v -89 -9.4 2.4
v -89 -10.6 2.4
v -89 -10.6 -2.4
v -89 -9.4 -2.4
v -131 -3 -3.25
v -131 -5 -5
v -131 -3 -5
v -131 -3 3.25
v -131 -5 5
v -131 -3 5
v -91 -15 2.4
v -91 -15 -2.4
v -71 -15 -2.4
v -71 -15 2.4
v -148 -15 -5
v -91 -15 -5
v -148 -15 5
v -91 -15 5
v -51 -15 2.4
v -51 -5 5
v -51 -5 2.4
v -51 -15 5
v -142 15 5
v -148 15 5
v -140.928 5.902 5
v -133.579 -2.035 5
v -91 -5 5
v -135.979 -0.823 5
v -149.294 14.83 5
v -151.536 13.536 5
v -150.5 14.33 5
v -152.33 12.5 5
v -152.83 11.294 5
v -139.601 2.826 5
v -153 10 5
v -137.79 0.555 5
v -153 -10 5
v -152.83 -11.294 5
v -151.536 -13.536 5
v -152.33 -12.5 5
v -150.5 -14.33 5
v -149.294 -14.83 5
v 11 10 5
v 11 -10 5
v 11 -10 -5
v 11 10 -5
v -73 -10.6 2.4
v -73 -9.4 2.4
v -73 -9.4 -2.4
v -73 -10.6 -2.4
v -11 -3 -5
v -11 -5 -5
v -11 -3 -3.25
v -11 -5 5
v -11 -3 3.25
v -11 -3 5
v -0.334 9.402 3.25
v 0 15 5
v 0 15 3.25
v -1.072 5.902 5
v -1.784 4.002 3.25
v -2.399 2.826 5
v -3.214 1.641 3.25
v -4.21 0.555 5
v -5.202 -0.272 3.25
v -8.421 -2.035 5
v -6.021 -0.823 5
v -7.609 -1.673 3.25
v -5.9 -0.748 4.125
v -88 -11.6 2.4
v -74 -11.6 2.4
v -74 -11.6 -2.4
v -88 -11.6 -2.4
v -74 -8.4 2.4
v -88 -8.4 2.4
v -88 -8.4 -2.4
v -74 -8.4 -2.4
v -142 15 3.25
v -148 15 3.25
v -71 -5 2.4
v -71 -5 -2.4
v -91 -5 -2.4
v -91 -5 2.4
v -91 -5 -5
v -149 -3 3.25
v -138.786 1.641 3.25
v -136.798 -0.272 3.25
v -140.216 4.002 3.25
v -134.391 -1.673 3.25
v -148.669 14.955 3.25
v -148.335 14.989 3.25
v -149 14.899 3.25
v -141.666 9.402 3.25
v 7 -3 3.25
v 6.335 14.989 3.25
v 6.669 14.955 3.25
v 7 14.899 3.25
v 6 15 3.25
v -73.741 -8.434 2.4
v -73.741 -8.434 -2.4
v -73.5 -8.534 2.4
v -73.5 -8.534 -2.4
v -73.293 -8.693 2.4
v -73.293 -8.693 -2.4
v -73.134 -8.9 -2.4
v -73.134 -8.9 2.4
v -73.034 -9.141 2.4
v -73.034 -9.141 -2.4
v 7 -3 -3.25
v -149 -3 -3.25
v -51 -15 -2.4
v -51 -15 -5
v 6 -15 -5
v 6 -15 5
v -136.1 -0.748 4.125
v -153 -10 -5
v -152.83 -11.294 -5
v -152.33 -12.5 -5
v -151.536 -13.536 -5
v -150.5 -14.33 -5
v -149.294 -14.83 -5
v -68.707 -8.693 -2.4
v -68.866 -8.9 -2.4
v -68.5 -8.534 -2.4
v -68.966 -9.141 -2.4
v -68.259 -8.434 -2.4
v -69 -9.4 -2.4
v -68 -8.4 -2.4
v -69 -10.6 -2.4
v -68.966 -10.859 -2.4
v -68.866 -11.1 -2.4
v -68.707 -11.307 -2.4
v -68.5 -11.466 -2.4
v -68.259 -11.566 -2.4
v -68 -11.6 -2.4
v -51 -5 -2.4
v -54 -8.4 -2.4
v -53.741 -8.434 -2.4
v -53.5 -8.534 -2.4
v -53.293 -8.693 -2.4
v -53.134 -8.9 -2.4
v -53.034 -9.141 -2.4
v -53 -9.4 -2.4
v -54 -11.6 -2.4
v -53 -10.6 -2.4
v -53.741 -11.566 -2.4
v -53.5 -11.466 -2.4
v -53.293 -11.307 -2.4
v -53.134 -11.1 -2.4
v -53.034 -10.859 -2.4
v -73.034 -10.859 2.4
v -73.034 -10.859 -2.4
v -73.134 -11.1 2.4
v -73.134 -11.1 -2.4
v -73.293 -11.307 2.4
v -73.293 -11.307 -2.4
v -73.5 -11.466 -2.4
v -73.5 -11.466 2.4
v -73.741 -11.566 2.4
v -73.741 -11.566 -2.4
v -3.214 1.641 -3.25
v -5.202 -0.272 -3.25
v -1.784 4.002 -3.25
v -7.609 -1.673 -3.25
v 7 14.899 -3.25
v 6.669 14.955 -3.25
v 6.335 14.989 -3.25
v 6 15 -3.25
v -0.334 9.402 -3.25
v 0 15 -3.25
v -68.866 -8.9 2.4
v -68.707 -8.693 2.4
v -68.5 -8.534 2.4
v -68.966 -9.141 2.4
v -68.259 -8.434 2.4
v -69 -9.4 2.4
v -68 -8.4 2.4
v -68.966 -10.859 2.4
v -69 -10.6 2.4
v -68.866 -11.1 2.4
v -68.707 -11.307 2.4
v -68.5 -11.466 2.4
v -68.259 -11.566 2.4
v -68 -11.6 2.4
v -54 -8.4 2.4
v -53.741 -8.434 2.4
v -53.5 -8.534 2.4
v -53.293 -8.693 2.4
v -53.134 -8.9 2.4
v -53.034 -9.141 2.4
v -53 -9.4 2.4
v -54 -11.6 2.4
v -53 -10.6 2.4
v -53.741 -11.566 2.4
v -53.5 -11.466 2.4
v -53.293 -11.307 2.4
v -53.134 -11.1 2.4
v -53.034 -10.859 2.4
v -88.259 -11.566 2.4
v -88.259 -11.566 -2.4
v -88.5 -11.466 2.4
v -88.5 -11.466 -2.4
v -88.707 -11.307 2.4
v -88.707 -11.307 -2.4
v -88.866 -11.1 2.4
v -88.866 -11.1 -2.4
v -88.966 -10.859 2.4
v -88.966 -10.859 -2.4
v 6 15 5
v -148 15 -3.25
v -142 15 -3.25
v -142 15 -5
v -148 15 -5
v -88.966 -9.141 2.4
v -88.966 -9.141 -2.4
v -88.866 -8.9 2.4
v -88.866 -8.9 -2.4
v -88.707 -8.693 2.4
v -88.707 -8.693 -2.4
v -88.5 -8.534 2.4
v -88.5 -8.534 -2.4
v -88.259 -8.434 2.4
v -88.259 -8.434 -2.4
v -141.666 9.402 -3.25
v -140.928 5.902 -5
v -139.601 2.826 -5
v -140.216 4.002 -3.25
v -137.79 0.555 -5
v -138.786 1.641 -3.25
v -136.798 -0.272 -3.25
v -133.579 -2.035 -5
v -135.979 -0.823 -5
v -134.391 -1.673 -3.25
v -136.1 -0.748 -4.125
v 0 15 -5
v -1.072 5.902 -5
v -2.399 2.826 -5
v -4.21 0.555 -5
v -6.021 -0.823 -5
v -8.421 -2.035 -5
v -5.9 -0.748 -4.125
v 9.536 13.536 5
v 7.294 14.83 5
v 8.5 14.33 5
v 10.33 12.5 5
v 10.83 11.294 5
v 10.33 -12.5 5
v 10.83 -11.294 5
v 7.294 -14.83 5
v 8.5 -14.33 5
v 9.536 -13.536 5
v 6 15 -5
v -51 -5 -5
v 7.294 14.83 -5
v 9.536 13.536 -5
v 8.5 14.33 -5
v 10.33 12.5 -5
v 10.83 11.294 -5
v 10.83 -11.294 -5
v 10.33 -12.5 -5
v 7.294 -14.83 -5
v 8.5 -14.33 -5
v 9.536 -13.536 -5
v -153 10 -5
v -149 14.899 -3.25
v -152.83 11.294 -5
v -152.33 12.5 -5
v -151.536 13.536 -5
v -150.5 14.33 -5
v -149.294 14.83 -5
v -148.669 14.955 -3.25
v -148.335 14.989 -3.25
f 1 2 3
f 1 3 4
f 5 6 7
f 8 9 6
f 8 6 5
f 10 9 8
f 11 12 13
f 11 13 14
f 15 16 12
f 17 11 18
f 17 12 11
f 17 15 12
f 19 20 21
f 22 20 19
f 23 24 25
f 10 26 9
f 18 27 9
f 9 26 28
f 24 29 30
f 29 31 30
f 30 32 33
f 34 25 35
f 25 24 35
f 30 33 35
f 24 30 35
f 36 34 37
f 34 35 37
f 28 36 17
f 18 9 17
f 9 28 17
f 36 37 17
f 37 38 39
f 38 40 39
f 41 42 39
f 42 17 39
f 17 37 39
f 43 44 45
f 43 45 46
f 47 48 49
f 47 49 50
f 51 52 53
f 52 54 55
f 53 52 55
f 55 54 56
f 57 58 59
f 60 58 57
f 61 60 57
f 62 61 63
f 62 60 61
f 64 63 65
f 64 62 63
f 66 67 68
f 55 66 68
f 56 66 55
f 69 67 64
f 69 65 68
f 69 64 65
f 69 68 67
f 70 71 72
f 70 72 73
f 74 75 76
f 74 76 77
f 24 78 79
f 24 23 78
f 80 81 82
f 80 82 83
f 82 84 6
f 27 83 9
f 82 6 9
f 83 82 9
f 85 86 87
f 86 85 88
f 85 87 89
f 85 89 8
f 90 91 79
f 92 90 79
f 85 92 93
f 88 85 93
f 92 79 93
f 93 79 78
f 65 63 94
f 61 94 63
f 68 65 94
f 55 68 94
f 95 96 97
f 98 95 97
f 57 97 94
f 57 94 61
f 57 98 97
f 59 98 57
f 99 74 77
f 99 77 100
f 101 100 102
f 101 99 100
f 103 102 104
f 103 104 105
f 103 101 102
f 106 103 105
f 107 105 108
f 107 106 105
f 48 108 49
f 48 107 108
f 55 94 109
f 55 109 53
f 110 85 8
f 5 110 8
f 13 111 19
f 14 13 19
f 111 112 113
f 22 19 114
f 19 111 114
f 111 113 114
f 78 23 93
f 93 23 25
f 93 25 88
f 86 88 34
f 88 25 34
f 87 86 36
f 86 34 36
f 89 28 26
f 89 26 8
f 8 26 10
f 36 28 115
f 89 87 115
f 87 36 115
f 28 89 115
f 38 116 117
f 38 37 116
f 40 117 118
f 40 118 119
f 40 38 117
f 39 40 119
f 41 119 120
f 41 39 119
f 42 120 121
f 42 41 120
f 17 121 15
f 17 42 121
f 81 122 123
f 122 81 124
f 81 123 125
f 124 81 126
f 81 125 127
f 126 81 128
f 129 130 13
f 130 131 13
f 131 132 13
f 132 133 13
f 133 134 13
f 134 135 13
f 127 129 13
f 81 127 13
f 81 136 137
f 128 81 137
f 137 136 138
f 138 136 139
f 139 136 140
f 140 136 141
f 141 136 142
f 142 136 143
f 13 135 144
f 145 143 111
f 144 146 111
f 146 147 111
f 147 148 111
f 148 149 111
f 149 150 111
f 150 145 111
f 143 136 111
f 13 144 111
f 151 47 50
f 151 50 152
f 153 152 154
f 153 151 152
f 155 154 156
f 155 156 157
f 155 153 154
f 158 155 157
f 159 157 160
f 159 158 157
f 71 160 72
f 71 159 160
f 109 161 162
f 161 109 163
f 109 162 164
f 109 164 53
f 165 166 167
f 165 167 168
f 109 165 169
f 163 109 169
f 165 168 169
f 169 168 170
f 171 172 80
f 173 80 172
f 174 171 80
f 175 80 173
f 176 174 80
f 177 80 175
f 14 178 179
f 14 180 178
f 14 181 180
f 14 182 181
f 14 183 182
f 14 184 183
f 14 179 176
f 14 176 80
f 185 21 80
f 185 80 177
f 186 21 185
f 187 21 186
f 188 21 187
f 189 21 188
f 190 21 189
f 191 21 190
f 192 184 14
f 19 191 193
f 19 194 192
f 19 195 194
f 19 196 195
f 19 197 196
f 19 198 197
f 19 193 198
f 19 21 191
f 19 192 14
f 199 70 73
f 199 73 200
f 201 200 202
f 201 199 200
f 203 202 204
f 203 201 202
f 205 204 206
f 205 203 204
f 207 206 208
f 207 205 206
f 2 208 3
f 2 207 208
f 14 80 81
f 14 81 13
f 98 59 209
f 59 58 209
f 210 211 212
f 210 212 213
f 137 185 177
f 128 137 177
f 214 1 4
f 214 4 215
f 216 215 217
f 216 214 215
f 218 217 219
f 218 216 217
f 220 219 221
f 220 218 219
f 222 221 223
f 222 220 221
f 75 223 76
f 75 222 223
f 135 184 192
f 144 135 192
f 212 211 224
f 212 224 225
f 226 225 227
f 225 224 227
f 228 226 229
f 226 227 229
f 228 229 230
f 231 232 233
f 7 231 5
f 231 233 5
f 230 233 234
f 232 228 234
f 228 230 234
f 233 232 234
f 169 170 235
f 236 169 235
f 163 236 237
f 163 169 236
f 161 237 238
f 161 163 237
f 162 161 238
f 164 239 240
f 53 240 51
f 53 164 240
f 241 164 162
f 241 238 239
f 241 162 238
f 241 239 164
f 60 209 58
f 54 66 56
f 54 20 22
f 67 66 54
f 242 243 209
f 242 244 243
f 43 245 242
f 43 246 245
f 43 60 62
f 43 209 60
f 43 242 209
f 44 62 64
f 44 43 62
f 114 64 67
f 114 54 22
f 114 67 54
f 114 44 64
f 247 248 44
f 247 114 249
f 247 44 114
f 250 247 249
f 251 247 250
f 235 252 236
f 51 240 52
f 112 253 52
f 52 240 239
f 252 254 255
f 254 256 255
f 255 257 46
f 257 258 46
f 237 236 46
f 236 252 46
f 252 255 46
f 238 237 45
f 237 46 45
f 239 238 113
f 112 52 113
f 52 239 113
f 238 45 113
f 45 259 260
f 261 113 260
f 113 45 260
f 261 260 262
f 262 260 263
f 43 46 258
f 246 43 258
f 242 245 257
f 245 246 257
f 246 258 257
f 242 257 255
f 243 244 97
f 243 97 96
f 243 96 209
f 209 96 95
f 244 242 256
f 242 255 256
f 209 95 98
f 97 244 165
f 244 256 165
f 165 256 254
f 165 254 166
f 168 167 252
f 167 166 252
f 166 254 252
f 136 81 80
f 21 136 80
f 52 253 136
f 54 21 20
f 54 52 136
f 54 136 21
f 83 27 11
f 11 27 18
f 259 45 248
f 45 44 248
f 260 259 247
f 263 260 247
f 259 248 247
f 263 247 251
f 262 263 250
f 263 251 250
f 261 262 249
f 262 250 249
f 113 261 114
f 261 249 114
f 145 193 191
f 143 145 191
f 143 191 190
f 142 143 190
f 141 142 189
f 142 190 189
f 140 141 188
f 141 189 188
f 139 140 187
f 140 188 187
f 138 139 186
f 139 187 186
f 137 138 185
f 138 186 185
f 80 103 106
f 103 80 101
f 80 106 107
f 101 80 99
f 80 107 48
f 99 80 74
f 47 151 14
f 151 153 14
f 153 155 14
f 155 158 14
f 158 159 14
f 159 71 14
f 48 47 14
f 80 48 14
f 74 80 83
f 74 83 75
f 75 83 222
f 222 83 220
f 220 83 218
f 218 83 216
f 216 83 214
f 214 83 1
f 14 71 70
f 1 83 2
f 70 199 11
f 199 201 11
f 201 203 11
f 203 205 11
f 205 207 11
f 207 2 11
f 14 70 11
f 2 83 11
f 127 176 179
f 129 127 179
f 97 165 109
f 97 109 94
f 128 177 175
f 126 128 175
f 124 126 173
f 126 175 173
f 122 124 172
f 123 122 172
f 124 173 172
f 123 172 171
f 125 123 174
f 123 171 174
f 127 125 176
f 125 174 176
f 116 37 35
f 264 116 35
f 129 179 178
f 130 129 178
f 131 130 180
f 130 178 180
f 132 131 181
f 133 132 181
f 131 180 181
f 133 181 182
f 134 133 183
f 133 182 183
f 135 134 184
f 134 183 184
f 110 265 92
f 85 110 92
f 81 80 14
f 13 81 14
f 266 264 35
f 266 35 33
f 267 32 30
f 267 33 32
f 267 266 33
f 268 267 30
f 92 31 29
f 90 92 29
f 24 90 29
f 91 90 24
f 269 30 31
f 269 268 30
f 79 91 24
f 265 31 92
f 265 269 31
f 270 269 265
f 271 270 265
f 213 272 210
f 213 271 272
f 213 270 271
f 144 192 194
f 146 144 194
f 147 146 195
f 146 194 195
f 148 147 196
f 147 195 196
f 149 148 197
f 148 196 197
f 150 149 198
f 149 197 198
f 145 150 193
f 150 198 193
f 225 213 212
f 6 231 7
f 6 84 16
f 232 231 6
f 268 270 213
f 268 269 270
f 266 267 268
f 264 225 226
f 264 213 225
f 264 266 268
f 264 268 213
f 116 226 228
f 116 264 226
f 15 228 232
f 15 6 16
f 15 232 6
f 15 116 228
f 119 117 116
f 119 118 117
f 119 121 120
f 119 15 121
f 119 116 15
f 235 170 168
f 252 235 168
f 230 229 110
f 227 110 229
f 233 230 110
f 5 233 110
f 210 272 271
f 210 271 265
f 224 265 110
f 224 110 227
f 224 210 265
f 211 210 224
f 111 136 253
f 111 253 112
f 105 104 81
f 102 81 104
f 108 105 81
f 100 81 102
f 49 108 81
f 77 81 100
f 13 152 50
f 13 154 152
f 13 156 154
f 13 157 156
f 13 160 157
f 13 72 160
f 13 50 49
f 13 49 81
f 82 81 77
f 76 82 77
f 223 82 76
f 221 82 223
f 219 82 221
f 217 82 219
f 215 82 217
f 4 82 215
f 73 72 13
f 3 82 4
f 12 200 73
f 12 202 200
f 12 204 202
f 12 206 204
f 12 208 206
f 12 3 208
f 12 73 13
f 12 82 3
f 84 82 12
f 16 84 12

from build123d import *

# Parameters (mm, degrees)
F0_W         = 22
F0_H         = 30
F1_DEPTH     = 5
F2_W         = 18
F2_H         = 6.5
F3_DEPTH     = 18
F4_W         = 10
F4_H         = 10
F5_DEPTH     = 40
F6_W         = 10
F6_H         = 4.8
F7_DEPTH     = 20
F9_DEPTH     = 4.8
F11_DEPTH    = 10
F12_R        = 5
F13_T1_DEPTH = 35


# Not quite as in the source:
# - a fillet or chamfer that OpenCascade refuses, or shapes differently, is made with other operations: its cross-section is extruded or revolved along the edge and cut away or added


with BuildPart() as f1:
    # F0 (on Top) → F1 (new body, symmetric)
    with BuildSketch(Plane.XY):
        Rectangle(F0_W, F0_H)
    extrude(amount=F1_DEPTH, both=True)

    # F2 (on face) → F3 (cut)
    with BuildSketch(Plane(origin=(0, 15, 0), x_dir=(-1, 0, 0), z_dir=(0, 1, 0))):
        with Locations((2, 0)):
            Rectangle(F2_W, F2_H)
    extrude(amount=-F3_DEPTH, mode=Mode.SUBTRACT)

    # F4 (on face) → F5 (join)
    with BuildSketch(Plane(origin=(-11, 0, 0), x_dir=(0, -1, 0), z_dir=(-1, 0, 0))):
        with Locations((10, 0)):
            Rectangle(F4_W, F4_H)
    extrude(amount=F5_DEPTH)

    # F6 (on face) → F7 (join)
    with BuildSketch(Plane(origin=(-51, 0, 0), x_dir=(0, -1, 0), z_dir=(-1, 0, 0))):
        with Locations((10, 0)):
            Rectangle(F6_W, F6_H)
    extrude(amount=F7_DEPTH)

    # F8 (on face) → F9 (cut, through all)
    with BuildSketch(Plane.XY.offset(2.4)):
        with BuildLine():
            Line((-54, -8.4), (-68, -8.4))
            ThreePointArc((-68, -8.4), (-68.7071067812, -8.6928932188), (-69, -9.4))
            Line((-69, -9.4), (-69, -10.6))
            ThreePointArc((-69, -10.6), (-68.7071067812, -11.3071067812), (-68, -11.6))
            Line((-68, -11.6), (-54, -11.6))
            ThreePointArc((-54, -11.6), (-53.2928932188, -11.3071067812), (-53, -10.6))
            Line((-53, -10.6), (-53, -9.4))
            ThreePointArc((-53, -9.4), (-53.2928932188, -8.6928932188), (-54, -8.4))
        make_face()
    extrude(amount=-F9_DEPTH, mode=Mode.SUBTRACT)

    # F10 (on face) → F11 (cut, through all)
    with BuildSketch(Plane.XY.offset(5)):
        with BuildLine():
            add(Edge.make_bspline(
                [(0, 15), (0, 6.0453137533), (-3.1729094877, -0.7953640379), (-10.9956707869, -2.9450245736), (-11, -3)],
                knots=[0, 0, 0, 0, 0.6345947949, 1, 1, 1, 1], degree=3))
            Line((0, 15), (-11, 15))
            Line((-11, 15), (-11, -3))
        make_face()
    extrude(amount=-F11_DEPTH, mode=Mode.SUBTRACT)

    # F12
    f12_edges = [f1.edges().sort_by_distance(p)[0] for p in [
        (11, -15, 0),
    ]]
    fillet(f12_edges, radius=F12_R)

    # F13: fillet of radius 5 on 1 edges, made by hand

    # F13_s2 → F13_t1 (cut)
    with BuildSketch(Plane.XY.offset(-17.5)):
        with BuildLine():
            ThreePointArc((11, 10), (9.5355339059, 13.5355339059), (6, 15))
            Line((6, 15), (11, 15))
            Line((11, 15), (11, 10))
        make_face()
    extrude(amount=F13_T1_DEPTH, mode=Mode.SUBTRACT)


with BuildPart() as f14_1:
    # F14: instance of F1
    add(f1.part.mirror(Plane(origin=(-71, -10, 0), x_dir=(0, -1, 0), z_dir=(-1, 0, 0))))


solid = Compound([f1.part, f14_1.part])
